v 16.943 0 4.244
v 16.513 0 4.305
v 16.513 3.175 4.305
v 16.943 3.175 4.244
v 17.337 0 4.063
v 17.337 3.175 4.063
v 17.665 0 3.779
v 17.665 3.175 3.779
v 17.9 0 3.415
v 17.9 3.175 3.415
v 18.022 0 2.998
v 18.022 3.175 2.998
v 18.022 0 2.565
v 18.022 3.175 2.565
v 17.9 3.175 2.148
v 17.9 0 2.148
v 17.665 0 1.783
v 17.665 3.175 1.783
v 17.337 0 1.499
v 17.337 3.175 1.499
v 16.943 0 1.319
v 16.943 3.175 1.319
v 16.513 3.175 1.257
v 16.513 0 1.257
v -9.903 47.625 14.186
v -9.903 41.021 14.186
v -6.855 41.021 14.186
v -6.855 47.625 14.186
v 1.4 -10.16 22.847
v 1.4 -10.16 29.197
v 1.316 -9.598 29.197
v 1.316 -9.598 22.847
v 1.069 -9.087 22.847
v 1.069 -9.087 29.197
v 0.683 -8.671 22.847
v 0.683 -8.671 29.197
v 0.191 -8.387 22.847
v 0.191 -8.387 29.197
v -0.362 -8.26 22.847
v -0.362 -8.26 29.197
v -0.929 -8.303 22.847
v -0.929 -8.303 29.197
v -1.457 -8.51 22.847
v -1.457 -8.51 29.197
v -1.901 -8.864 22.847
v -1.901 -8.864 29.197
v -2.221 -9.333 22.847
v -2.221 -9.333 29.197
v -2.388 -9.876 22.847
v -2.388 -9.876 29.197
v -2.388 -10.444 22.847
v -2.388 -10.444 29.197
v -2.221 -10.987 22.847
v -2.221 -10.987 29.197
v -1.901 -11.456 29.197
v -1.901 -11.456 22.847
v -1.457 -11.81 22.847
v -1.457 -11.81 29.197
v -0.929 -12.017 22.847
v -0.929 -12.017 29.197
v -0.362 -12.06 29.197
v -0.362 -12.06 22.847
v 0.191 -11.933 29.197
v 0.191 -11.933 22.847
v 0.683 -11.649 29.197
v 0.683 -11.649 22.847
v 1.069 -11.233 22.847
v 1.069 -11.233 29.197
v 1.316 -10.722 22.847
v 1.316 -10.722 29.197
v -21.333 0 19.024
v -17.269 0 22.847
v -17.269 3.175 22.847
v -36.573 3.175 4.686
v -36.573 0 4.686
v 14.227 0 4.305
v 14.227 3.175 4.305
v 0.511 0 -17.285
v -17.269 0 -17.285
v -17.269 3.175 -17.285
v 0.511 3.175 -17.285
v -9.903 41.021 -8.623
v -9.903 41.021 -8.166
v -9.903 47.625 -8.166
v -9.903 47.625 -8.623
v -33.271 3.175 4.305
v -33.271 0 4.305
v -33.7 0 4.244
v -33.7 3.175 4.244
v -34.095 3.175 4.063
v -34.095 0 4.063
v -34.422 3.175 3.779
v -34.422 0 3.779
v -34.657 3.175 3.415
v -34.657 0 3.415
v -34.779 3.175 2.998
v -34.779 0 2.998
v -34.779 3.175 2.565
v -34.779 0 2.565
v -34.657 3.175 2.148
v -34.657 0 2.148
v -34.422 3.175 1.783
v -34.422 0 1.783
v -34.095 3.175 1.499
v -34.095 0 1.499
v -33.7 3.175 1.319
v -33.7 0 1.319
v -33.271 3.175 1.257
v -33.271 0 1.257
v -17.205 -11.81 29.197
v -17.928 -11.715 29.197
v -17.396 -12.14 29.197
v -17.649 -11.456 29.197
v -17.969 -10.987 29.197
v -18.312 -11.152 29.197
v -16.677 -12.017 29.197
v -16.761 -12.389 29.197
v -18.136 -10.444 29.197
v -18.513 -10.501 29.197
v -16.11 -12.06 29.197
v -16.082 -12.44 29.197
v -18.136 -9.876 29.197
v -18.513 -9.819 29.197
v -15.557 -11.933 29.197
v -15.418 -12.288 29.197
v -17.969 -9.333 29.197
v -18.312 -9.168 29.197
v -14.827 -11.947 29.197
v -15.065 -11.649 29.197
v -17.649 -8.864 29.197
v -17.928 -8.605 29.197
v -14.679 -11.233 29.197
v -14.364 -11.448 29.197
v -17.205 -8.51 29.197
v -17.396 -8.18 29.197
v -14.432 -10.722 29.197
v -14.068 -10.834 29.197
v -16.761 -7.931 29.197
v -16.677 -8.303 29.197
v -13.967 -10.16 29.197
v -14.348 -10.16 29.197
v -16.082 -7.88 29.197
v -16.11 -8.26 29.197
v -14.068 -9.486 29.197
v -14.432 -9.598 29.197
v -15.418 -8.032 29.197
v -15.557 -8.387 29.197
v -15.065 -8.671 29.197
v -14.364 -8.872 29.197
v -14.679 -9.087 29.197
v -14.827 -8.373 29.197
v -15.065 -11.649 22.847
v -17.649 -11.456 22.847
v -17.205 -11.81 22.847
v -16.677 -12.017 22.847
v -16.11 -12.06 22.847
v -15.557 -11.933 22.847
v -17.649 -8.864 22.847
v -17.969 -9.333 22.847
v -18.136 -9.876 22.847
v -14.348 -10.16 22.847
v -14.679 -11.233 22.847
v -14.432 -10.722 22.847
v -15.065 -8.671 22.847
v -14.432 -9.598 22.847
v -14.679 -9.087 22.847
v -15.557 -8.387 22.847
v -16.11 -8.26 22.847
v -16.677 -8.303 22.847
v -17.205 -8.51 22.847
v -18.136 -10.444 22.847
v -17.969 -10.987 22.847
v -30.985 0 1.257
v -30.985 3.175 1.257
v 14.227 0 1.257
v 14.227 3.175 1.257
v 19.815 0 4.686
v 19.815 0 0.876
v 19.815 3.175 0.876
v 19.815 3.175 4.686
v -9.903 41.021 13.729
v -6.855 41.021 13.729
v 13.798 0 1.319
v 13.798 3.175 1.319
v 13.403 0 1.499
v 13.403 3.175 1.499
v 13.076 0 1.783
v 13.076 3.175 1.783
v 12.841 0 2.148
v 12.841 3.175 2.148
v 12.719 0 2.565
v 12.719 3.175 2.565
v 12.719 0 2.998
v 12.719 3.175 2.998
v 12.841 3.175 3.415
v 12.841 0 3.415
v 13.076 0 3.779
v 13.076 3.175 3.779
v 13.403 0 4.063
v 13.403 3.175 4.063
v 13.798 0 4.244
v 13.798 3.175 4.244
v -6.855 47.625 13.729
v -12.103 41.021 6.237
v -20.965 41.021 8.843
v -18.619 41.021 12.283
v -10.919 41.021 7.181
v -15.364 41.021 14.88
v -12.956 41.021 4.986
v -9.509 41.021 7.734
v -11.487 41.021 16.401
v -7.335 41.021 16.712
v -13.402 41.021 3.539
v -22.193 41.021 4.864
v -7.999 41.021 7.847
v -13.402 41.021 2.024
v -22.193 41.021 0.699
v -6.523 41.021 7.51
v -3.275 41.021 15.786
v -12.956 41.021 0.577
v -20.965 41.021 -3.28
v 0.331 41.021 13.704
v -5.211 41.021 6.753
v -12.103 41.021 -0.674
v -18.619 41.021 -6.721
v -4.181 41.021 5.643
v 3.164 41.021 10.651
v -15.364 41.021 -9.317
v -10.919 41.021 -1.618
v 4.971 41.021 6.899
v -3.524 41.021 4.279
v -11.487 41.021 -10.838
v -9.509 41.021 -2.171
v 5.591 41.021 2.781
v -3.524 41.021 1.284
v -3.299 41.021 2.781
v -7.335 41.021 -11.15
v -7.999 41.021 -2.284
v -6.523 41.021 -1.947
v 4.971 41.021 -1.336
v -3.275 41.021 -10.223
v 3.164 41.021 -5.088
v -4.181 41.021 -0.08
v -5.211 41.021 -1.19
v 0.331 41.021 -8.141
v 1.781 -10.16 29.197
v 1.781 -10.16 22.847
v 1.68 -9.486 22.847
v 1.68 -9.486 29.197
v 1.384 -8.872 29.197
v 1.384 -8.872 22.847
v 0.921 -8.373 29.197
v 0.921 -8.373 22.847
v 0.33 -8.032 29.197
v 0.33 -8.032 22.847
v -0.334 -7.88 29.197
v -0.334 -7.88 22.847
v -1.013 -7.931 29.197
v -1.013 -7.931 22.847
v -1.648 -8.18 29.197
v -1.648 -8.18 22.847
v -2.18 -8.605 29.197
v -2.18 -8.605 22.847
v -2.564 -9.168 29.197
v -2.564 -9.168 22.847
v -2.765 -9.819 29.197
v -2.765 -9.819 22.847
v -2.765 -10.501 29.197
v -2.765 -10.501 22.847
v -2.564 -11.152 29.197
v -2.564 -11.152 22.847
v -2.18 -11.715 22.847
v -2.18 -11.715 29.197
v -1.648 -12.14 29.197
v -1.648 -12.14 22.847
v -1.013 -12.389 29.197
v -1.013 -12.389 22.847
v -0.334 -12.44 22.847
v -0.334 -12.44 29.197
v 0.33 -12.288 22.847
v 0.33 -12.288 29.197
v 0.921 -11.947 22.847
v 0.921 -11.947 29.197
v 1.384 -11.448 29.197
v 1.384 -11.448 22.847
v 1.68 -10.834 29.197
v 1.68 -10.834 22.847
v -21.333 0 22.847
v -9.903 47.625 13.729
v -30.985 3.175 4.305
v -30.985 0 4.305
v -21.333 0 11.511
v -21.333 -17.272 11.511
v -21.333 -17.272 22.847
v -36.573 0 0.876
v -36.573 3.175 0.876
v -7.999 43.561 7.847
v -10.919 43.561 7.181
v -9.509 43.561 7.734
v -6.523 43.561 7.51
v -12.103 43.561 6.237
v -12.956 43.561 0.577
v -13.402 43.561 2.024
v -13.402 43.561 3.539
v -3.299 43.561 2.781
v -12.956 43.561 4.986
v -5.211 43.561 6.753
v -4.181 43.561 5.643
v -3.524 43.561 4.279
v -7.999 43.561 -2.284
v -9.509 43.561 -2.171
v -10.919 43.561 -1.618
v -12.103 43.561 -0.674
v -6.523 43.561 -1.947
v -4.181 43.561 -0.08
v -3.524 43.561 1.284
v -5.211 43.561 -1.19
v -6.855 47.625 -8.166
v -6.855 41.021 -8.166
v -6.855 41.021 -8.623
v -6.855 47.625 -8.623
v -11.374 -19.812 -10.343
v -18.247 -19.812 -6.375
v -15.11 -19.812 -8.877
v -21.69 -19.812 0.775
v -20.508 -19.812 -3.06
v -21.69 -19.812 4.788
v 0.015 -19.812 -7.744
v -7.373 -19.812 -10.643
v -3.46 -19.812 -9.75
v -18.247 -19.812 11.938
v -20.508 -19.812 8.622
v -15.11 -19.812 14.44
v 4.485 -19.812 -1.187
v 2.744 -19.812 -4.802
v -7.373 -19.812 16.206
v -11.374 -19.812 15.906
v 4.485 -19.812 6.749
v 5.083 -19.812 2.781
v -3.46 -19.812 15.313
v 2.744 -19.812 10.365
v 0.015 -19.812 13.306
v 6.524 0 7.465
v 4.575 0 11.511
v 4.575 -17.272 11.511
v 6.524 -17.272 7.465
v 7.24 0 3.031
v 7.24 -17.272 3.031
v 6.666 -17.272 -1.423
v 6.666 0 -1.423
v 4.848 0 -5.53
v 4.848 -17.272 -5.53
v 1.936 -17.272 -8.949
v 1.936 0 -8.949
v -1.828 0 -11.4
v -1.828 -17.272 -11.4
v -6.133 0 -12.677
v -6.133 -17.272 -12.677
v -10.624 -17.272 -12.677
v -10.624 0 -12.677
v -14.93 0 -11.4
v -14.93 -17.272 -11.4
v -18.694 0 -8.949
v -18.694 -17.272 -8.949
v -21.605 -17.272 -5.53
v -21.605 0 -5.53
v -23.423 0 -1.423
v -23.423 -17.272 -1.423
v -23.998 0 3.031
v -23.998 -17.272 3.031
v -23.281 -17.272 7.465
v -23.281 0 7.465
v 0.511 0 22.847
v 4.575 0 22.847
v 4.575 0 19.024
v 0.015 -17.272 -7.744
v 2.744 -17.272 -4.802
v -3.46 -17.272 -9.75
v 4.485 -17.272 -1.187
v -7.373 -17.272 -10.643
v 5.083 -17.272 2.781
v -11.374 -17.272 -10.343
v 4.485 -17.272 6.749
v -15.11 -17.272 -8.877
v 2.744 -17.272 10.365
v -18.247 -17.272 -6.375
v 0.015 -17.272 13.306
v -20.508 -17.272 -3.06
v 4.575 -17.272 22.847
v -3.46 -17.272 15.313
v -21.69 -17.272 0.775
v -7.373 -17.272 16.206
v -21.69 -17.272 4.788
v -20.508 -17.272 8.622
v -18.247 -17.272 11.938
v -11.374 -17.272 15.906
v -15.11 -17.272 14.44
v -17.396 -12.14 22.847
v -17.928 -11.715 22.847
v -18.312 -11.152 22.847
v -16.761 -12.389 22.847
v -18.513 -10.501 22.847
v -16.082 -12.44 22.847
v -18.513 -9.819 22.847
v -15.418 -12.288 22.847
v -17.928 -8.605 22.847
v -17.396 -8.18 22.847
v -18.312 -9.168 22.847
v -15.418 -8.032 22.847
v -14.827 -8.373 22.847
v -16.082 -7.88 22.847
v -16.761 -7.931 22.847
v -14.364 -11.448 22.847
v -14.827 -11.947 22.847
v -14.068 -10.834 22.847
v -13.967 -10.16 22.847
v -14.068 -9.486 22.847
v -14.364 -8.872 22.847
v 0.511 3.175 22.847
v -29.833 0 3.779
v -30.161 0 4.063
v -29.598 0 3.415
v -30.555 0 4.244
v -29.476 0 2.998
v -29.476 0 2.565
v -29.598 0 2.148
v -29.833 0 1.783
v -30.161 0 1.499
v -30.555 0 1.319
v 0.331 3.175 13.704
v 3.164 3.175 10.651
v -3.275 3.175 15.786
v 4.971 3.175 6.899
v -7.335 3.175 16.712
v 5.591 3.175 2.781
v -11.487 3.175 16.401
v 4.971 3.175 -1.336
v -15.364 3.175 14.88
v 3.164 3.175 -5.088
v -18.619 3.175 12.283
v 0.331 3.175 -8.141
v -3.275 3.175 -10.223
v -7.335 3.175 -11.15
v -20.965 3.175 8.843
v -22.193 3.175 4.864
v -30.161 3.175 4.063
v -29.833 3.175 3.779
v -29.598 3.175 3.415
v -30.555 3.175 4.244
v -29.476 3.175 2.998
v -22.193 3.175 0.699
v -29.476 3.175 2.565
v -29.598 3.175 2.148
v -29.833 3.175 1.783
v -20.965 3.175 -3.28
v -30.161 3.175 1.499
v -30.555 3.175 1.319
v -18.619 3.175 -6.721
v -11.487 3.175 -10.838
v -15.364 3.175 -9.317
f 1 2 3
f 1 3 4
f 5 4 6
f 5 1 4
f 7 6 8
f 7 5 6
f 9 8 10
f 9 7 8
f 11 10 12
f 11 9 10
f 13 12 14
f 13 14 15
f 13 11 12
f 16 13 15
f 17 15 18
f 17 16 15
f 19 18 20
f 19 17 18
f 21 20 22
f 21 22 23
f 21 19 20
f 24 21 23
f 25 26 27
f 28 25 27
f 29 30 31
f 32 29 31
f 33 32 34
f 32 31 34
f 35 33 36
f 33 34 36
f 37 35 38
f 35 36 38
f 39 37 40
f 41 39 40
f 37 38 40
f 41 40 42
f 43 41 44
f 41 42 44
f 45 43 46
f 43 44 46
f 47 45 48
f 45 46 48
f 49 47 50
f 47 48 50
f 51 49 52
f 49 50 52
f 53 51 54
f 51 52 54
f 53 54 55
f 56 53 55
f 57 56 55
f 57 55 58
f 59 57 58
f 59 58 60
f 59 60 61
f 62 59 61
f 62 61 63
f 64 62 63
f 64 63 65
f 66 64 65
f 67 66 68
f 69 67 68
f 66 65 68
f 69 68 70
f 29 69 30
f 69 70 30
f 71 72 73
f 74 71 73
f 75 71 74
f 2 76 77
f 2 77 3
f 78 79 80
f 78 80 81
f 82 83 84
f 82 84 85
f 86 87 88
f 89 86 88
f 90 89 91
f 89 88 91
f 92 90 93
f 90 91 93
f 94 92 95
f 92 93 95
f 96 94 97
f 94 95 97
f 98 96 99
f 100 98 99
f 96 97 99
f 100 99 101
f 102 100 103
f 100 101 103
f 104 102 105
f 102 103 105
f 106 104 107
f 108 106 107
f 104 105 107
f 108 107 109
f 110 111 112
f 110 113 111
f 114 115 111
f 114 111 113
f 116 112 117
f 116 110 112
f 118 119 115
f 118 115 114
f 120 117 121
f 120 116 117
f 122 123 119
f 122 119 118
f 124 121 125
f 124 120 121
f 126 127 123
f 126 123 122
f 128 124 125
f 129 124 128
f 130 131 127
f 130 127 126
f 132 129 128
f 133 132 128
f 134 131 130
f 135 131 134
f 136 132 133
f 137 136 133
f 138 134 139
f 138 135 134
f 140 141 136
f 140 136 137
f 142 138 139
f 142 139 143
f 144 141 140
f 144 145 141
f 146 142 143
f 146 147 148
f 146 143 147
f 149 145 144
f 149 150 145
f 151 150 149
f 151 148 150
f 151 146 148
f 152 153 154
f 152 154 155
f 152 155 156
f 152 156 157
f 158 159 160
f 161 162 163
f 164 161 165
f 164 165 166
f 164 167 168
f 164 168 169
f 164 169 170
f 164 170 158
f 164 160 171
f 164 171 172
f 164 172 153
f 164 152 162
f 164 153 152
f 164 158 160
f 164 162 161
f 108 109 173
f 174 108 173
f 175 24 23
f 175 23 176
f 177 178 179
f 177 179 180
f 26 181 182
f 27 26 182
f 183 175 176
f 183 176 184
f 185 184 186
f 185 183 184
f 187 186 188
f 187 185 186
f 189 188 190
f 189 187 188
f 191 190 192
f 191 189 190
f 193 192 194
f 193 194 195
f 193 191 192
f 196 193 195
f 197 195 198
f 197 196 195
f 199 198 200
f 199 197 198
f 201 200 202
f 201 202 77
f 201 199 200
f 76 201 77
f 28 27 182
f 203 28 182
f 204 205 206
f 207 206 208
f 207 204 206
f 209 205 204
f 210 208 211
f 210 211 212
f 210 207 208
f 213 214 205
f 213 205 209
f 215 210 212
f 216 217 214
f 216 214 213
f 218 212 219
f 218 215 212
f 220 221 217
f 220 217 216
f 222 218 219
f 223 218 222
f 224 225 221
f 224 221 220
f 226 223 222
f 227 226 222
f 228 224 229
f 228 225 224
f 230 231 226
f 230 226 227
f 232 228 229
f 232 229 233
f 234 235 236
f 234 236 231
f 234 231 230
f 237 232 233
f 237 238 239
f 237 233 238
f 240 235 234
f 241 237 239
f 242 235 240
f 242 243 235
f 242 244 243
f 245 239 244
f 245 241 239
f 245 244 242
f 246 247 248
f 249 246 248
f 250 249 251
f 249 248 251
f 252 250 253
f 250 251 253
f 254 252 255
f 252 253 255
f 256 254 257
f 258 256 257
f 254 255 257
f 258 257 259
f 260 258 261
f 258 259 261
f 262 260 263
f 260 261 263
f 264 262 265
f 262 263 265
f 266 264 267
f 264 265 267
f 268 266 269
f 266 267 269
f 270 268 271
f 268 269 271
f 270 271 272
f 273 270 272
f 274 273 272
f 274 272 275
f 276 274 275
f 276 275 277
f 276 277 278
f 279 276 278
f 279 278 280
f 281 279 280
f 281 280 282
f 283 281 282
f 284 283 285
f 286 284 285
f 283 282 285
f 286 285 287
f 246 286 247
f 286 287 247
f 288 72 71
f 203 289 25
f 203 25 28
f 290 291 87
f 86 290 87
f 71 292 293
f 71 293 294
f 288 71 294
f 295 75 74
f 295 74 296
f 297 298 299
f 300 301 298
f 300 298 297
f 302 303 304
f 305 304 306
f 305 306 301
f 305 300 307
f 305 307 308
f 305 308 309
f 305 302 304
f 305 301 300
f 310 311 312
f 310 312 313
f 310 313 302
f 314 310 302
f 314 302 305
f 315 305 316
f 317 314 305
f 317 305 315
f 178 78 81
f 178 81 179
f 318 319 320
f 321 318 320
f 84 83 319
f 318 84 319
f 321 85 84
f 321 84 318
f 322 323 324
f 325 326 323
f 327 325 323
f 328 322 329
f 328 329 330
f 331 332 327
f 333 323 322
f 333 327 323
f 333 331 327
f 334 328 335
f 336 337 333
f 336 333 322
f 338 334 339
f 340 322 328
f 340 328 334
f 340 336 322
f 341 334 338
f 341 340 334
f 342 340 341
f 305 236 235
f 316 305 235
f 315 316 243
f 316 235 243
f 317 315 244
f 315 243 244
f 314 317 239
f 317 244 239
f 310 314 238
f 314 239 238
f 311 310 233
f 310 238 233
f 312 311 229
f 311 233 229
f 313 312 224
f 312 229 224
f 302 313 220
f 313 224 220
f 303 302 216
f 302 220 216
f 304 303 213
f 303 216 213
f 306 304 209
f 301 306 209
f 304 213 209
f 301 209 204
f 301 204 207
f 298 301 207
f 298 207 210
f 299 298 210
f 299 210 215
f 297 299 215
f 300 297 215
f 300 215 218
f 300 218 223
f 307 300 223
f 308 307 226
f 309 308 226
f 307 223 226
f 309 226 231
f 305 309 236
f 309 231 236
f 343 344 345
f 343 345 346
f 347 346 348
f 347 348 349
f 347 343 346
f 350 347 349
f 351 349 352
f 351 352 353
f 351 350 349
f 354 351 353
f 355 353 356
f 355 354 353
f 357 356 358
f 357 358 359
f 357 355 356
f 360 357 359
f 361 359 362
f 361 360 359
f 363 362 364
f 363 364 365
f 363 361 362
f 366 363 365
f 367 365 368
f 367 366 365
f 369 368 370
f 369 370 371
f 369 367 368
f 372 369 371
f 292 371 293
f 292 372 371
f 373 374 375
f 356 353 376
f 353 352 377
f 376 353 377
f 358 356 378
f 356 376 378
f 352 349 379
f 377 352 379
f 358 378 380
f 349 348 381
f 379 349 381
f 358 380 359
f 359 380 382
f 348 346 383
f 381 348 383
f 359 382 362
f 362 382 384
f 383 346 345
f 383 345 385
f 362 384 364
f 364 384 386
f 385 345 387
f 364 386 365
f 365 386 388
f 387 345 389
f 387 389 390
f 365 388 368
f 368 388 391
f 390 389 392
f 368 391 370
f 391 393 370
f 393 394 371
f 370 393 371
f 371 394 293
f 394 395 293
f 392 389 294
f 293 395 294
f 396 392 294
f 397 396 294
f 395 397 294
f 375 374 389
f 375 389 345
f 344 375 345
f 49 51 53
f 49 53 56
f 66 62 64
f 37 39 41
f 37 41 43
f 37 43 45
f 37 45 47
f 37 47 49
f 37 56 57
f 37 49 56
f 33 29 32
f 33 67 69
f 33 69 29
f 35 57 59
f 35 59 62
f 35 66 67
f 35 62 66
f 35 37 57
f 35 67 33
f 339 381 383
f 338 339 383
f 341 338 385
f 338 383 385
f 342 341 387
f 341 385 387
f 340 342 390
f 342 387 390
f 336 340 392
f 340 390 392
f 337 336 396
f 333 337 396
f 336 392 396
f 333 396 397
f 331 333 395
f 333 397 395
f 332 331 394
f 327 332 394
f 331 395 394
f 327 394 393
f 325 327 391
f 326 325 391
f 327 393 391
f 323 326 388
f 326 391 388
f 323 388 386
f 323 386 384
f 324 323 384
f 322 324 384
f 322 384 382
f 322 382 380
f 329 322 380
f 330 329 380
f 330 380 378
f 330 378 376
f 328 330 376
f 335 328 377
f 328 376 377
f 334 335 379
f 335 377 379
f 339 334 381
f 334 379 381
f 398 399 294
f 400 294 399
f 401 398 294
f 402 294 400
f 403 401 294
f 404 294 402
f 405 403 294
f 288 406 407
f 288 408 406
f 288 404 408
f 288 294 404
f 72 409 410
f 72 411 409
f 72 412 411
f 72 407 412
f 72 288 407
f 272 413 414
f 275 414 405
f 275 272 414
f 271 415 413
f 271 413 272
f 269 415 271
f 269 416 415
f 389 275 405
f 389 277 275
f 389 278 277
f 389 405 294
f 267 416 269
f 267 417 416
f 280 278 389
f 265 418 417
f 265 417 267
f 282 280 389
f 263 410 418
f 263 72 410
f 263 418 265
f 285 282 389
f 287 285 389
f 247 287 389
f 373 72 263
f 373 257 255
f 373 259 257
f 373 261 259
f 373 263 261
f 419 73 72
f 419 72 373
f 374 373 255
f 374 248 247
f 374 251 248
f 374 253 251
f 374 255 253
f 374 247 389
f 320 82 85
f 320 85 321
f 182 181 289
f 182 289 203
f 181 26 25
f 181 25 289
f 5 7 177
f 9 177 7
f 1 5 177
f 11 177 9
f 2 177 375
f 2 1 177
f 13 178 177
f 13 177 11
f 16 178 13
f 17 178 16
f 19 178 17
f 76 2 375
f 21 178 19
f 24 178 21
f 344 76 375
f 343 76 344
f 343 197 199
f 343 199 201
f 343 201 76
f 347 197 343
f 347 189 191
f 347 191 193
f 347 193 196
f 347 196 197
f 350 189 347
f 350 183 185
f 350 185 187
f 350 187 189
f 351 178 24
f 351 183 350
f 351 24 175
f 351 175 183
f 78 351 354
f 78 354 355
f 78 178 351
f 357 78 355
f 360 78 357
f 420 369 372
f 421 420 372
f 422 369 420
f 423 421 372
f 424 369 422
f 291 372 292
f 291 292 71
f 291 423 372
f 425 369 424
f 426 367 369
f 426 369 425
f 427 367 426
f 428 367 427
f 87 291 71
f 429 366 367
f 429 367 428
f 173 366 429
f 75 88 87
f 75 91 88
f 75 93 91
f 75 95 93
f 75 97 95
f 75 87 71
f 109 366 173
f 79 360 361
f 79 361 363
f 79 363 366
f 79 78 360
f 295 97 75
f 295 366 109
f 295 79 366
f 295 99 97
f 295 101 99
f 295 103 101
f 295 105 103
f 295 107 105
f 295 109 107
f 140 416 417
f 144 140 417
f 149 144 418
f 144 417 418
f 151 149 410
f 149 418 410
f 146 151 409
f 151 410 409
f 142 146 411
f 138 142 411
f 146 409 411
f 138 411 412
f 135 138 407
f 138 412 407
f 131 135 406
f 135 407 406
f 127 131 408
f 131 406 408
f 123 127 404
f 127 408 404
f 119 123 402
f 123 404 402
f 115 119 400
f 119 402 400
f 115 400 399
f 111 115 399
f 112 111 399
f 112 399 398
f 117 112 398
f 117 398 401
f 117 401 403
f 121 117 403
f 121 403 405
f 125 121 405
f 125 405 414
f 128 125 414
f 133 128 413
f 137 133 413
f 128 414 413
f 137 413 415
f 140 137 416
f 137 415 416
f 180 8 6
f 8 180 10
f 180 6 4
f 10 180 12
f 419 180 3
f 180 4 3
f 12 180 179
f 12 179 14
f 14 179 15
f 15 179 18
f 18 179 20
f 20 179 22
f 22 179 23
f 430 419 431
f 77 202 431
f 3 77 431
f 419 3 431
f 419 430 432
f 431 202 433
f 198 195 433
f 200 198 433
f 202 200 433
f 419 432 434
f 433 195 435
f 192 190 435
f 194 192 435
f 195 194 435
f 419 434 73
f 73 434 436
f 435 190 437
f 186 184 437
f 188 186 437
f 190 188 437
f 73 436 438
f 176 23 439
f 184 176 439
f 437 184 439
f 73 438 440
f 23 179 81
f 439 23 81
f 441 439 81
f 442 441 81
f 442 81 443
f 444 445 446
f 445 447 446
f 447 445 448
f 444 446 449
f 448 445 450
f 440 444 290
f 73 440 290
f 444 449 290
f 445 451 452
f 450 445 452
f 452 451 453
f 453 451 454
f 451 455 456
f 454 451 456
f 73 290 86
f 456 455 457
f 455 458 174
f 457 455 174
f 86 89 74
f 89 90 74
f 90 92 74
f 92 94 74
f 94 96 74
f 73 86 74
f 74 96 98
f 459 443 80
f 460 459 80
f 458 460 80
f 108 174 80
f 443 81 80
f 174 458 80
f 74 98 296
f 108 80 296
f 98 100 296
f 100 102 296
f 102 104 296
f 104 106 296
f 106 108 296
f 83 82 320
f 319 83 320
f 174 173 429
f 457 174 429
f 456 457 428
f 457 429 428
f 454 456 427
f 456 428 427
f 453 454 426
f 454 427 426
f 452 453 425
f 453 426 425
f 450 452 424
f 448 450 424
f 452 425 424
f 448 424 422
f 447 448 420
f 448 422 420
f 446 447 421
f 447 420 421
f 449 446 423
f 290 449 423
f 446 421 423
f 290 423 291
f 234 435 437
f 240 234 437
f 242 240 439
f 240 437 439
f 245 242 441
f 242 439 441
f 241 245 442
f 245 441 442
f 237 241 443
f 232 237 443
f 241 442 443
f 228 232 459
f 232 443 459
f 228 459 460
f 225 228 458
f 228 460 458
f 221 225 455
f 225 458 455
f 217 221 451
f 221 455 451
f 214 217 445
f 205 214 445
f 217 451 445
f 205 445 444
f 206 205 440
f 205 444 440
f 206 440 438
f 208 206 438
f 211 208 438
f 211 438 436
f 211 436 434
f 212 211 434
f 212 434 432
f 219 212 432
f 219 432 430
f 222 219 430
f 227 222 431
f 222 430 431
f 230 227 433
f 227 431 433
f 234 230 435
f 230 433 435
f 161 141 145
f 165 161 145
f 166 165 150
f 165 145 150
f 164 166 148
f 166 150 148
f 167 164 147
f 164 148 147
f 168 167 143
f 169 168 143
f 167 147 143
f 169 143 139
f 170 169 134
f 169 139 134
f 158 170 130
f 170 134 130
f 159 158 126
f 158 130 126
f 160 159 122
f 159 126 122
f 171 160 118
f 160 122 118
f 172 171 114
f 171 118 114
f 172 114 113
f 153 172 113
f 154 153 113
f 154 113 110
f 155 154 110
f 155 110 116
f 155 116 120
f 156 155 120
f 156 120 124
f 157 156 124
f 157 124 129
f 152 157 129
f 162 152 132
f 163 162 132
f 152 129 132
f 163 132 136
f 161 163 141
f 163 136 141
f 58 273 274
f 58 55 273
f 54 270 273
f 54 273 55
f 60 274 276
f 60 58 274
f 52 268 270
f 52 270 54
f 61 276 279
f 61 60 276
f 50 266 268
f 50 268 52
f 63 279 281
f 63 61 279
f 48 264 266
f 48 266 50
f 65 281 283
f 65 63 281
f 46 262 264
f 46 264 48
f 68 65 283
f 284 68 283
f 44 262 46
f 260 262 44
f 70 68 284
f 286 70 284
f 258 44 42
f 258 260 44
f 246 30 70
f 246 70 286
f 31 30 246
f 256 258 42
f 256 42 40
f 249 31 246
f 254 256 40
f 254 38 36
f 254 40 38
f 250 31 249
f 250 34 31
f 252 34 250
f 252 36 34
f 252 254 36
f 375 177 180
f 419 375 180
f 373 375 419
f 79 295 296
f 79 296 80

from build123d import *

# Parameters (mm, degrees)
BOSS_EXTRUDE1_DEPTH   = 3.175
SKETCH2_R             = 13.97
BOSS_EXTRUDE2_DEPTH   = 37.846
SKETCH3_R             = 5.08
BOSS_EXTRUDE3_DEPTH   = 2.54
SKETCH5_W             = 3.048
SKETCH5_H             = 0.4572
BOSS_EXTRUDE4_DEPTH   = 6.604
BOSS_EXTRUDE4_2_DEPTH = 6.604
BOSS_EXTRUDE5_DEPTH   = 17.272
SKETCH7_R             = 13.462
BOSS_EXTRUDE6_DEPTH   = 2.54
SKETCH8_R             = 2.286
BOSS_EXTRUDE7_DEPTH   = 6.35
SKETCH9_R             = 1.905
CUT_EXTRUDE1_DEPTH    = 6.35
CUT_EXTRUDE2_DEPTH    = 3.175


with BuildPart() as part:
    # Sketch1 → Boss-Extrude1 (new body)
    with BuildSketch(Plane(origin=(0, 0, 0), x_dir=(1, 0, 0), z_dir=(0, 1, 0))):
        Polygon((-17.268720614, 17.284574257), (0.511279386, 17.284574257), (19.815279386, -0.876425743), (19.815279386, -4.686425743), (0.511279386, -22.847425743), (-17.268720614, -22.847425743), (-36.572720614, -4.686425743), (-36.572720614, -0.876425743), align=None)
    extrude(amount=BOSS_EXTRUDE1_DEPTH)

    # Sketch2 → Boss-Extrude2 (add)
    with BuildSketch(Plane(origin=(0, 3.175, 0), x_dir=(1, 0, 0), z_dir=(0, 1, 0))):
        with Locations((-8.378720614, -2.781425743)):
            Circle(SKETCH2_R)
    extrude(amount=BOSS_EXTRUDE2_DEPTH)

    # Sketch3 → Boss-Extrude3 (add)
    with BuildSketch(Plane(origin=(0, 41.021, 0), x_dir=(1, 0, 0), z_dir=(0, 1, 0))):
        with Locations((-8.378720614, -2.781425743)):
            Circle(SKETCH3_R)
    extrude(amount=BOSS_EXTRUDE3_DEPTH)

    # Sketch6 → Boss-Extrude5 (add)
    with BuildSketch(Plane.XZ):
        with BuildLine():
            Line((-21.100004151, 22.847425743), (4.575279386, 22.847425743))
            Line((4.575279386, 22.847425743), (4.575279386, 11.511232441))
            ThreePointArc((4.575279386, 11.511232441), (-8.378720614, -12.839574257), (-21.332720614, 11.511232441))
            Line((-21.332720614, 11.511232441), (-21.332720614, 22.847425743))
            Line((-21.332720614, 22.847425743), (-21.100004151, 22.847425743))
        make_face()
    extrude(amount=BOSS_EXTRUDE5_DEPTH)

    # Sketch7 → Boss-Extrude6 (add)
    with BuildSketch(Plane.XZ.offset(17.272)):
        with Locations((-8.378720614, 2.781425743)):
            Circle(SKETCH7_R)
    extrude(amount=BOSS_EXTRUDE6_DEPTH)

    # Sketch8 → Boss-Extrude7 (add)
    with BuildSketch(Plane.XY.offset(22.847425743)):
        with Locations((-0.504720614, -10.16)):
            Circle(SKETCH8_R)
        with Locations((-16.252720614, -10.16)):
            Circle(SKETCH8_R)
    extrude(amount=BOSS_EXTRUDE7_DEPTH)

    # Sketch9 → Cut-Extrude1 (cut)
    with BuildSketch(Plane.XY.offset(29.197425743)):
        with Locations((-0.504720614, -10.16)):
            Circle(SKETCH9_R)
        with Locations((-16.252720614, -10.16)):
            Circle(SKETCH9_R)
    extrude(amount=-CUT_EXTRUDE1_DEPTH, mode=Mode.SUBTRACT)

    # Sketch10 → Cut-Extrude2 (cut)
    with BuildSketch(Plane.XZ):
        with BuildLine():
            Line((16.513279386, 1.257425743), (14.227279386, 1.257425743))
            ThreePointArc((14.227279386, 1.257425743), (12.703279386, 2.781425743), (14.227279386, 4.305425743))
            Line((14.227279386, 4.305425743), (16.513279386, 4.305425743))
            ThreePointArc((16.513279386, 4.305425743), (18.037279386, 2.781425743), (16.513279386, 1.257425743))
        make_face()
        with BuildLine():
            Line((-33.270720614, 1.257425743), (-30.984720614, 1.257425743))
            ThreePointArc((-30.984720614, 1.257425743), (-29.460720614, 2.781425743), (-30.984720614, 4.305425743))
            Line((-30.984720614, 4.305425743), (-33.270720614, 4.305425743))
            ThreePointArc((-33.270720614, 4.305425743), (-34.794720614, 2.781425743), (-33.270720614, 1.257425743))
        make_face()
    extrude(amount=-CUT_EXTRUDE2_DEPTH, mode=Mode.SUBTRACT)


with BuildPart() as body_2:
    # Sketch5 → Boss-Extrude4 (new body)
    with BuildSketch(Plane(origin=(0, 41.021, 0), x_dir=(1, 0, 0), z_dir=(0, 1, 0))):
        with Locations((-8.378720614, 8.394574257)):
            Rectangle(SKETCH5_W, SKETCH5_H)
    extrude(amount=BOSS_EXTRUDE4_DEPTH)


with BuildPart() as body_3:
    # Sketch5 → Boss-Extrude4 2 (new body)
    with BuildSketch(Plane(origin=(0, 41.021, 0), x_dir=(1, 0, 0), z_dir=(0, 1, 0))):
        with Locations((-8.378720614, -13.957425743)):
            Rectangle(SKETCH5_W, SKETCH5_H)
    extrude(amount=BOSS_EXTRUDE4_2_DEPTH)


solid = Compound([part.part, body_2.part, body_3.part])
